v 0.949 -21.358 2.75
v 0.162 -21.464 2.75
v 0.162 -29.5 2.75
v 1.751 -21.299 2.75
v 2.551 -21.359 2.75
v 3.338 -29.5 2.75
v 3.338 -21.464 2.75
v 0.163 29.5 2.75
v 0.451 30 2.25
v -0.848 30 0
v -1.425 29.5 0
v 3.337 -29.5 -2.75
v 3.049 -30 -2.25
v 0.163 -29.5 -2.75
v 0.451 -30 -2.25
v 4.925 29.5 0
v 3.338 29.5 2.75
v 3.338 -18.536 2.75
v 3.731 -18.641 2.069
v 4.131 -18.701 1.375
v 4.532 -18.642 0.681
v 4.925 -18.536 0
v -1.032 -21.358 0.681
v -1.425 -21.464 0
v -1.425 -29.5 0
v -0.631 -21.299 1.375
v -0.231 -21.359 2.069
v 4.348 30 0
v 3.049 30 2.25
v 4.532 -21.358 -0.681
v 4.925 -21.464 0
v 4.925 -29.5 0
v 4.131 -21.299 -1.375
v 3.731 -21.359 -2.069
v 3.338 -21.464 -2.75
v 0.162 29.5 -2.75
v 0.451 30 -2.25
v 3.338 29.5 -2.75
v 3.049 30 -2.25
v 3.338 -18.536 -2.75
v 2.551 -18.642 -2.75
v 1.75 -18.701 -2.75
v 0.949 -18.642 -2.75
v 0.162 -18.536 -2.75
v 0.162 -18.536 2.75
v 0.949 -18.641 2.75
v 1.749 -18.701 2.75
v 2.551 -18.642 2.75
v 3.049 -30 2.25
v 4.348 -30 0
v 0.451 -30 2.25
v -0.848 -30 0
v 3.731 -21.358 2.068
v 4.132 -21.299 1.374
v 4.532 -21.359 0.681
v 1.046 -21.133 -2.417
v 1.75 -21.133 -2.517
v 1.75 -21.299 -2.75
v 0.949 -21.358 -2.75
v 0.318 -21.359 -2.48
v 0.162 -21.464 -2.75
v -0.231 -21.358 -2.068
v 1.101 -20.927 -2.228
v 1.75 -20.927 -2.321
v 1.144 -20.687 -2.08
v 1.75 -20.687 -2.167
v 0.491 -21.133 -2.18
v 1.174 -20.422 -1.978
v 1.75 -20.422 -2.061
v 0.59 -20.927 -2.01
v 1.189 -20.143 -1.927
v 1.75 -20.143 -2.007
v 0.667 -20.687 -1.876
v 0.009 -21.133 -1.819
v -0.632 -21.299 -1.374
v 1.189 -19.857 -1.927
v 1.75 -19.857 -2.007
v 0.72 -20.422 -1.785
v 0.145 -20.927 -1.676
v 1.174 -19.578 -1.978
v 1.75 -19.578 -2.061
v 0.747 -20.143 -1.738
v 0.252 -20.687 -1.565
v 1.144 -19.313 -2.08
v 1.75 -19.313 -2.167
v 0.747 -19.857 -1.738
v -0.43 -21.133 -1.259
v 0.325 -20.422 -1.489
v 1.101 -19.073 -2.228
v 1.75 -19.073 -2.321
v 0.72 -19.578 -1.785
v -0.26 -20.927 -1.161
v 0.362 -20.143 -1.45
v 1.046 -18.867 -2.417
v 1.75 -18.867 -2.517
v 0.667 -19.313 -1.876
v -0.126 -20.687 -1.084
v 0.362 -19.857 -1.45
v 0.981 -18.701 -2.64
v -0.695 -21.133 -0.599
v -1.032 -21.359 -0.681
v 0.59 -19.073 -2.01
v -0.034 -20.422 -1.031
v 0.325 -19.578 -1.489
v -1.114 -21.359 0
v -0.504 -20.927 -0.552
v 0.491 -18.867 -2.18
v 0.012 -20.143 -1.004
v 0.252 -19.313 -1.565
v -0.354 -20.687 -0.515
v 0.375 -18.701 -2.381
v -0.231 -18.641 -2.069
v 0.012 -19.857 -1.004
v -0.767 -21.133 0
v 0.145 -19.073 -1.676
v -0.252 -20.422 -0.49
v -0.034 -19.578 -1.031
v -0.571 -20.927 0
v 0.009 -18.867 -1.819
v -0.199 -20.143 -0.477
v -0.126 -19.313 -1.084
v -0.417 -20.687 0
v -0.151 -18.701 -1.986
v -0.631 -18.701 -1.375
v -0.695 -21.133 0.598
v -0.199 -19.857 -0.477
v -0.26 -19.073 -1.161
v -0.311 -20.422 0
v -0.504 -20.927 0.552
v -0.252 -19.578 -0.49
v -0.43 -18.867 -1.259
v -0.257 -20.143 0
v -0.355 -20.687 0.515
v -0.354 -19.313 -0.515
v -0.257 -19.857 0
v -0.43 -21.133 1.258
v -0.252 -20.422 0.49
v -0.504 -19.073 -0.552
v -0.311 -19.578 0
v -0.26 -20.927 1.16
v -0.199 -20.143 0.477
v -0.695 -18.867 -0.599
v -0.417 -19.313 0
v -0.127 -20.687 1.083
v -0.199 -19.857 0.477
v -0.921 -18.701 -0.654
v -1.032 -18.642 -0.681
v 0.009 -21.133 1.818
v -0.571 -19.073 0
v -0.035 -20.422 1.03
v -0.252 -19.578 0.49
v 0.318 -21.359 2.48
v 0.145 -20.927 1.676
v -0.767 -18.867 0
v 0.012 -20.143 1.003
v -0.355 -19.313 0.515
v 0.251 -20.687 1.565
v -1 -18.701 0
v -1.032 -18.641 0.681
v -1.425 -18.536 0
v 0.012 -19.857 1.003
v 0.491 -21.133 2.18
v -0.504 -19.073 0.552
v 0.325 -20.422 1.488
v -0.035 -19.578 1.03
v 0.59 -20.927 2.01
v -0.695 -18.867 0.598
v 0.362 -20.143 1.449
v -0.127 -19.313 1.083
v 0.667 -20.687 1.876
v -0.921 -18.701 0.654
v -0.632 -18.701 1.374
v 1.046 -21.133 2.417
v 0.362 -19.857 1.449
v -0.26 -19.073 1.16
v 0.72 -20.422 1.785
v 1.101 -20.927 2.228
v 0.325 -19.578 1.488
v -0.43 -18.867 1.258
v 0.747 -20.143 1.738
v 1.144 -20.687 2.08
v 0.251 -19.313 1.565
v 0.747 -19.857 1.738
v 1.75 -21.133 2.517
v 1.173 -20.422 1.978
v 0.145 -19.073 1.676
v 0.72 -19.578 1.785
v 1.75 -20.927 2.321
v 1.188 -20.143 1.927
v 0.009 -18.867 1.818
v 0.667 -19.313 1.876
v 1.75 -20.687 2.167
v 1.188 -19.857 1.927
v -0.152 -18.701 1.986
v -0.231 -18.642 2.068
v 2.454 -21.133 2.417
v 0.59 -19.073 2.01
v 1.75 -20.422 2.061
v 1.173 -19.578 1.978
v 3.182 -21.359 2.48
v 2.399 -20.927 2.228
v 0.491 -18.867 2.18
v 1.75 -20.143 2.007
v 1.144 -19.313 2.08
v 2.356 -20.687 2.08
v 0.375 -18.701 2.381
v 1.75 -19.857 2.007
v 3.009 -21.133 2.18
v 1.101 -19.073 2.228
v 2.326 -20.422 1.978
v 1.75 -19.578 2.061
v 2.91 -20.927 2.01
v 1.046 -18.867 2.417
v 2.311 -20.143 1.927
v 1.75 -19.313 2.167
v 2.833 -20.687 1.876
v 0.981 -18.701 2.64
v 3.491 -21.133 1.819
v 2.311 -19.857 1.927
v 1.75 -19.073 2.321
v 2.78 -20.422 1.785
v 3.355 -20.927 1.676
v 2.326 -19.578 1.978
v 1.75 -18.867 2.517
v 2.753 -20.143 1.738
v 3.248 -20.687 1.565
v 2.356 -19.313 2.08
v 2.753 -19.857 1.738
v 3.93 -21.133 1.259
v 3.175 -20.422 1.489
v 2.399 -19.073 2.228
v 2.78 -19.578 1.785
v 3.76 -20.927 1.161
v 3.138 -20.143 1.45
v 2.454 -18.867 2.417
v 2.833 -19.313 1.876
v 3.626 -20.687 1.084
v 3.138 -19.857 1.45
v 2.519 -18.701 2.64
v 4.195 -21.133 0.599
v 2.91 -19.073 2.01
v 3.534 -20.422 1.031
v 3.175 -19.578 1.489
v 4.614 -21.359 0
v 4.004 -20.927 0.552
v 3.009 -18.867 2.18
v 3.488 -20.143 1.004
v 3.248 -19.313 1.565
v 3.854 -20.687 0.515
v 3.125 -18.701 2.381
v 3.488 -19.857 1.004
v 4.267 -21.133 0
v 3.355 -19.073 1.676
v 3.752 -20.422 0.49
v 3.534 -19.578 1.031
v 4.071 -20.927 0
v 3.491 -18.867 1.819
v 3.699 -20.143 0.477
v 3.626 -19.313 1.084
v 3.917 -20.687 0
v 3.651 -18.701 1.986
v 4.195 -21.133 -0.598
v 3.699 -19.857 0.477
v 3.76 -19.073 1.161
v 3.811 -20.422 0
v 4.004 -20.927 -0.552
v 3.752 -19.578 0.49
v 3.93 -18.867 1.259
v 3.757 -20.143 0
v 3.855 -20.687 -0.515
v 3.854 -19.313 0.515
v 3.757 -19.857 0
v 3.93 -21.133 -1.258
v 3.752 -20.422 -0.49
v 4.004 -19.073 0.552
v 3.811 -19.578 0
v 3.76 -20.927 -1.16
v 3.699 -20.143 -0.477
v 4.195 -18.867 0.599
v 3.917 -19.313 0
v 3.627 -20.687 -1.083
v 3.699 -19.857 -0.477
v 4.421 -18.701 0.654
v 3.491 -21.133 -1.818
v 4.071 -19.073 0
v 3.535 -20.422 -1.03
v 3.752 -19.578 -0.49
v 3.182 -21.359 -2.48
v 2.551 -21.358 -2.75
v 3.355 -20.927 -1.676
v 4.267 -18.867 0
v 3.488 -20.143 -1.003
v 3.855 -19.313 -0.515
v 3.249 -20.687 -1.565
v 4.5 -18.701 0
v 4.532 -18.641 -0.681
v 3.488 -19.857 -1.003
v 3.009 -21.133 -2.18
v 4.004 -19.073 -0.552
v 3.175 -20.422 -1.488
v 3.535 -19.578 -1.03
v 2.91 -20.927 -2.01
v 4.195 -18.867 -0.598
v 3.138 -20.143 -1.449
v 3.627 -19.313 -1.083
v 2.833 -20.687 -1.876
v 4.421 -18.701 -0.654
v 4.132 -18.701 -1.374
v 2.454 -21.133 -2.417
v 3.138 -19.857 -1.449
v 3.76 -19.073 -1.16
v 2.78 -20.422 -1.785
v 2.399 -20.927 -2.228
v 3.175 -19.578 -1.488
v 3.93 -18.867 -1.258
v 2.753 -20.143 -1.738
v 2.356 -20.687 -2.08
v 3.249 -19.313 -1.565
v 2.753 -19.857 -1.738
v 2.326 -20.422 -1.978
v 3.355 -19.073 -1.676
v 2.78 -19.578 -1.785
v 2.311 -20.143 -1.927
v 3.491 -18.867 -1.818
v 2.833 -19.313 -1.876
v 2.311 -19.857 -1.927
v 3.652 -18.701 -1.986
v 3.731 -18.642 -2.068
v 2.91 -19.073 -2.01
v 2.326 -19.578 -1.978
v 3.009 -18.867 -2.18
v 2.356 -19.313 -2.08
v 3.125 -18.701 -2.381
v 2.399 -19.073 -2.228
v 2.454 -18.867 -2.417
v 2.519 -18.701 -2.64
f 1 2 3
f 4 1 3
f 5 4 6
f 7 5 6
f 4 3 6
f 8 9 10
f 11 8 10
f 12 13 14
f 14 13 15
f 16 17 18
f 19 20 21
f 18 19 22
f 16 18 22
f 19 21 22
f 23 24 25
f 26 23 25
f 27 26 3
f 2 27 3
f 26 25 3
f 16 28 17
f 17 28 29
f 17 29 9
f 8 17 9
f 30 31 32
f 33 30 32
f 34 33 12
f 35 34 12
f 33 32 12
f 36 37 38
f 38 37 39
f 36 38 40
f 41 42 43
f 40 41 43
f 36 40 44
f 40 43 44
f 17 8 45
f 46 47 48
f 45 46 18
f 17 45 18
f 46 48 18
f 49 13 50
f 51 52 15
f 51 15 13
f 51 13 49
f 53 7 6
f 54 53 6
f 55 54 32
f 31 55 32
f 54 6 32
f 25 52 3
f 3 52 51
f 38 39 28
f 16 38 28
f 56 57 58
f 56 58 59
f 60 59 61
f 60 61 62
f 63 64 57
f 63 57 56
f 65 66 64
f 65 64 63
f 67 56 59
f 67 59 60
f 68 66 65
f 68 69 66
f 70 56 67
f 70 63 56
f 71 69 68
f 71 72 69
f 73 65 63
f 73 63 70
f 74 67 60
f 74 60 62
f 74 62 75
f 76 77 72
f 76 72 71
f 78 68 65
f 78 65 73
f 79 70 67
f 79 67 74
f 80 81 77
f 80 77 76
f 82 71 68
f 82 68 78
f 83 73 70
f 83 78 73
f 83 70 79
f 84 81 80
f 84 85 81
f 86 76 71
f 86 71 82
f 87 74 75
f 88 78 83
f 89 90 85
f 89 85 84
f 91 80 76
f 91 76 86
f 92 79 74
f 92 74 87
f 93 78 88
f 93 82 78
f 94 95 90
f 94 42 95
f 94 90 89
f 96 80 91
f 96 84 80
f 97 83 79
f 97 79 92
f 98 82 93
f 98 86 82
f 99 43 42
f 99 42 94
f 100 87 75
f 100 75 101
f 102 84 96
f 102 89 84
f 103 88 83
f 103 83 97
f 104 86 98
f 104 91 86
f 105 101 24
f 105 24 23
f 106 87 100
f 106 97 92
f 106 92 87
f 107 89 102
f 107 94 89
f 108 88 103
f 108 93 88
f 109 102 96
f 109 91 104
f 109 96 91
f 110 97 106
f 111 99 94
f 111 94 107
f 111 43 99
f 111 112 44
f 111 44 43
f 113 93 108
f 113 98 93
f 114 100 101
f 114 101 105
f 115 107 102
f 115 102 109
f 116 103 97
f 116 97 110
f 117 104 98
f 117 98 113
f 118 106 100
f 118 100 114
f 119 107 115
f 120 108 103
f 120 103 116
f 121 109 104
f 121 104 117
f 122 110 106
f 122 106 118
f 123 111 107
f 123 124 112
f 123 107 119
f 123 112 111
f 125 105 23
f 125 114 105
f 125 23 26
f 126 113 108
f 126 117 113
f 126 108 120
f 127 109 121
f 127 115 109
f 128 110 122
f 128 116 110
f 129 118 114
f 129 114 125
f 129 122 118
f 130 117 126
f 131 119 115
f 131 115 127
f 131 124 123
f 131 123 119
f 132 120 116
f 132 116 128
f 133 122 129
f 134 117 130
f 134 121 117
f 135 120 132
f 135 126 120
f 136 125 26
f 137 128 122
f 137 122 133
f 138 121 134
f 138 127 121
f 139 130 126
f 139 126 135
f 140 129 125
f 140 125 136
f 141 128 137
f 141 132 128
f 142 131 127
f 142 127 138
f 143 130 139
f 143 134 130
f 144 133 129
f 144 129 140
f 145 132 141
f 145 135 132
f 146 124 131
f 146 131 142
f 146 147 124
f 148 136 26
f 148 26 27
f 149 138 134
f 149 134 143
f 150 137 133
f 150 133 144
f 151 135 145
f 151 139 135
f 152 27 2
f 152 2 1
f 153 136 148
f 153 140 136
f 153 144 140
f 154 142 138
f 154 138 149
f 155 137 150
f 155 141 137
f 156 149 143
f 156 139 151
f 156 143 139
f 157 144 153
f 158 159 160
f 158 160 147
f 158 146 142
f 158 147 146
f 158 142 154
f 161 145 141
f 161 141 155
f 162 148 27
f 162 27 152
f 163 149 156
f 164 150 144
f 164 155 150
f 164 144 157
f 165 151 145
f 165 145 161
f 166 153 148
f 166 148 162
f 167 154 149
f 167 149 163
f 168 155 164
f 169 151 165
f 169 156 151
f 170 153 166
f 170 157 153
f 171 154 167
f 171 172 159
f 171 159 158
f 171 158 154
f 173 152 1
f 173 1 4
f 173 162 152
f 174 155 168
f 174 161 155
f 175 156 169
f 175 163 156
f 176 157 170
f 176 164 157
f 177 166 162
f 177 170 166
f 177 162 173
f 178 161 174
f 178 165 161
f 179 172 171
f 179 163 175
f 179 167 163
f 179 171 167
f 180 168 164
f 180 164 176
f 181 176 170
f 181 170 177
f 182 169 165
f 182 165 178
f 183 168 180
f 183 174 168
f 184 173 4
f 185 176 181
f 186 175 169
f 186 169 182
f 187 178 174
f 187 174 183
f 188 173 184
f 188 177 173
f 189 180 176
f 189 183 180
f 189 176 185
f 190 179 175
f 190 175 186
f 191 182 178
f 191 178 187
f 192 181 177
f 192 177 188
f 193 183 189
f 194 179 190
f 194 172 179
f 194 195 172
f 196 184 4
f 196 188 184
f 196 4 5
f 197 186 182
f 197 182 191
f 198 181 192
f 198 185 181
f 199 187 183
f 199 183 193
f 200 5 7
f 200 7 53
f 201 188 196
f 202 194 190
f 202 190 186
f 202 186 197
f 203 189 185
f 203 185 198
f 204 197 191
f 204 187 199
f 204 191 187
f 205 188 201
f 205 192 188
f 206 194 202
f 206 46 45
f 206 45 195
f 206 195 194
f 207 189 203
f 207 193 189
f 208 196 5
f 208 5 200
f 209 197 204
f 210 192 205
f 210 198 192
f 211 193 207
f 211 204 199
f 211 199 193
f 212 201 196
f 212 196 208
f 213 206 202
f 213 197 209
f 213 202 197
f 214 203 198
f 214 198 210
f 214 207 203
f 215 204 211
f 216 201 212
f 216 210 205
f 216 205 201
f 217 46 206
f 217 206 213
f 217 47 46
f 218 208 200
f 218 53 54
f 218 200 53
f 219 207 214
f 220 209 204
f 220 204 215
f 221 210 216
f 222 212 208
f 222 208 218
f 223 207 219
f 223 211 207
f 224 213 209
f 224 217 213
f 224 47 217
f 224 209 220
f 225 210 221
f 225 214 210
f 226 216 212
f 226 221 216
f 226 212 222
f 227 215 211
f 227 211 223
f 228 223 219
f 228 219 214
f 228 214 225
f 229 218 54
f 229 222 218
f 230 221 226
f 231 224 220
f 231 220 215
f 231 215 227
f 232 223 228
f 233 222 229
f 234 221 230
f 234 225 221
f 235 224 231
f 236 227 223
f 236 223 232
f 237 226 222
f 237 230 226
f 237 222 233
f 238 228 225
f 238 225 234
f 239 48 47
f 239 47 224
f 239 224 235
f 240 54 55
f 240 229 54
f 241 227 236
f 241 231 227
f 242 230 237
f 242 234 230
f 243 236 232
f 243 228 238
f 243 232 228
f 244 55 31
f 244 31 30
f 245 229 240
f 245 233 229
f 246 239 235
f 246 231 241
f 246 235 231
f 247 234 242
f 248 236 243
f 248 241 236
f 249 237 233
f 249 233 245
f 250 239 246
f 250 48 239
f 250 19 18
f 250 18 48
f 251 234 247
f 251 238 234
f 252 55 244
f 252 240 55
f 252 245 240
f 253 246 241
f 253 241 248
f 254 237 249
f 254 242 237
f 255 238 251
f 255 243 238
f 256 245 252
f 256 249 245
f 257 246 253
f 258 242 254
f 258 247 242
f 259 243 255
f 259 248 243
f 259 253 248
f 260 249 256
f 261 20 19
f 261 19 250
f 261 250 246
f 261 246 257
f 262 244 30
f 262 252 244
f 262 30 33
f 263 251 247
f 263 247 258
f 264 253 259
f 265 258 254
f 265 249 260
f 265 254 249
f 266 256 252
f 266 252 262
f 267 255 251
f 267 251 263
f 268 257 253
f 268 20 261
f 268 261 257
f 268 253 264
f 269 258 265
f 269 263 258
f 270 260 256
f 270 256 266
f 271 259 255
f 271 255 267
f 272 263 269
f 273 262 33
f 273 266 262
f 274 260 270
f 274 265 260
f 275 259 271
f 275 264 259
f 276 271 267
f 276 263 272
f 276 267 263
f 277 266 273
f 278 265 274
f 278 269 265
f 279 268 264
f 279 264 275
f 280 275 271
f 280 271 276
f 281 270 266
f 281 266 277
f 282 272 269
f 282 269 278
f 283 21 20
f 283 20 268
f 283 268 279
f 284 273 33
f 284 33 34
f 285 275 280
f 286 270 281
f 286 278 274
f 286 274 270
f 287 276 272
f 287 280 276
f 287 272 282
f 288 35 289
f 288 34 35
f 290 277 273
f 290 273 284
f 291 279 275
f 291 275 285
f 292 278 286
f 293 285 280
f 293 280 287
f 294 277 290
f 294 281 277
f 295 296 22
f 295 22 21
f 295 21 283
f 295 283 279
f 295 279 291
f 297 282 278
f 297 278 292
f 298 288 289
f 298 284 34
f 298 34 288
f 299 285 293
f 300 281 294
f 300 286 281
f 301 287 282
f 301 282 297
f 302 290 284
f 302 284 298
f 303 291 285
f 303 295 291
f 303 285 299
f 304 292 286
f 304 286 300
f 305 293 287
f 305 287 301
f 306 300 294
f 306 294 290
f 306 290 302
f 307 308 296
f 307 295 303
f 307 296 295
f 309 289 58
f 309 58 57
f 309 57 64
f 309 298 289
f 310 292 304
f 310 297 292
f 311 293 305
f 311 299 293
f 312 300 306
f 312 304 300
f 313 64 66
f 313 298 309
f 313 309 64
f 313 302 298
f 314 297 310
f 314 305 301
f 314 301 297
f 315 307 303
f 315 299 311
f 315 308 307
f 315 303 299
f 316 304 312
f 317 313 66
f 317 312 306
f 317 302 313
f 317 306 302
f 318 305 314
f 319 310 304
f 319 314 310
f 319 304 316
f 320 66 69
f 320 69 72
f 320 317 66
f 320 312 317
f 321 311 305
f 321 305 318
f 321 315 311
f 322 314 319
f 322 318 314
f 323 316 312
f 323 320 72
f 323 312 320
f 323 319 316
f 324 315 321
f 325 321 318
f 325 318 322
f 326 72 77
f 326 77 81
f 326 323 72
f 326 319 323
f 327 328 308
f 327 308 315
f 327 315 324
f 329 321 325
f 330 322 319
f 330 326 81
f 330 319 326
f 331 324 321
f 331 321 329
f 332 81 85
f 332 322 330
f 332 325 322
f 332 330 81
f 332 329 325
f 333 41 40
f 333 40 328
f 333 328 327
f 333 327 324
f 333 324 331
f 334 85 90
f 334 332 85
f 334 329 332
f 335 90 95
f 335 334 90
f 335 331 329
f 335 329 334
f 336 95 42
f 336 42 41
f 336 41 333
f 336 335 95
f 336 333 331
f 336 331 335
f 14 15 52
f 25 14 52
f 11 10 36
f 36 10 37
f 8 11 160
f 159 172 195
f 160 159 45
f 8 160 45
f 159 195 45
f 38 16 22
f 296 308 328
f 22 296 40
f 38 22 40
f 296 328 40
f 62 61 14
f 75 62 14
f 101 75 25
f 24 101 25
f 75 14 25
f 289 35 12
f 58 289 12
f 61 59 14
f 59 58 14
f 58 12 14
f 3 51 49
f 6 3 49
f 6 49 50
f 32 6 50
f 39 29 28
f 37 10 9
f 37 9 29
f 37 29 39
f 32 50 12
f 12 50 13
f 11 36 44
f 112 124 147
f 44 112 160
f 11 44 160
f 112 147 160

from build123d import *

# Parameters (mm, degrees)
CUT_EXTRUDE1_DEPTH      = 31.656361493
CUT_EXTRUDE1_DEPTH_BACK = 31.656361493
SKETCH5_R               = 4
CHAMFER1_SIZE           = 0.5


with BuildPart() as part:
    # Sketch2 → Revolve1 (revolve)
    with BuildSketch(Plane.XY, mode=Mode.PRIVATE) as revolve1_sk:
        with BuildLine():
            Line((-1.75, -18.5), (-1.75, 30))
            Line((-1.75, 30), (1.75, 30))
            Line((1.75, 30), (1.75, -30))
            Line((1.75, -30), (-1.75, -30))
            Line((-1.75, -30), (-1.75, -21.5))
            ThreePointArc((-1.75, -21.5), (-0.25, -20), (-1.75, -18.5))
        make_face()
    revolve(revolve1_sk.sketch.rotate(Axis((1.75, -30, 0), (0, 1, 0)), 270), axis=Axis((1.75, -30, 0), (0, 1, 0)))

    # Sketch5 → Cut-Extrude1 (cut, two sides: drawn at the far end of the back side and taken through both)
    with BuildSketch(Plane(origin=(0, 0, 0), x_dir=(1, 0, 0), z_dir=(0, 1, 0)).offset(-CUT_EXTRUDE1_DEPTH_BACK)):
        with Locations((1.75, 0)):
            Circle(SKETCH5_R)
        Polygon((4.925, 0), (3.3375, 2.749630657), (0.1625, 2.749630657), (-1.425, 0), (0.1625, -2.749630657), (3.3375, -2.749630657), align=None, mode=Mode.SUBTRACT)
    extrude(amount=CUT_EXTRUDE1_DEPTH + CUT_EXTRUDE1_DEPTH_BACK, mode=Mode.SUBTRACT)

    # Chamfer1
    chamfer1_edges = [part.edges().sort_by_distance(p)[0] for p in [
        (1.75, -30, 2.749630657),
        (4.13125, -30, 1.374815329),
        (4.13125, -30, -1.374815329),
        (1.75, -30, -2.749630657),
        (-0.63125, -30, -1.374815329),
        (-0.63125, -30, 1.374815329),
        (4.13125, 30, 1.374815329),
        (1.75, 30, 2.749630657),
        (-0.63125, 30, 1.374815329),
        (-0.63125, 30, -1.374815329),
        (1.75, 30, -2.749630657),
        (4.13125, 30, -1.374815329),
    ]]
    chamfer(chamfer1_edges, length=CHAMFER1_SIZE)


solid = part.part
